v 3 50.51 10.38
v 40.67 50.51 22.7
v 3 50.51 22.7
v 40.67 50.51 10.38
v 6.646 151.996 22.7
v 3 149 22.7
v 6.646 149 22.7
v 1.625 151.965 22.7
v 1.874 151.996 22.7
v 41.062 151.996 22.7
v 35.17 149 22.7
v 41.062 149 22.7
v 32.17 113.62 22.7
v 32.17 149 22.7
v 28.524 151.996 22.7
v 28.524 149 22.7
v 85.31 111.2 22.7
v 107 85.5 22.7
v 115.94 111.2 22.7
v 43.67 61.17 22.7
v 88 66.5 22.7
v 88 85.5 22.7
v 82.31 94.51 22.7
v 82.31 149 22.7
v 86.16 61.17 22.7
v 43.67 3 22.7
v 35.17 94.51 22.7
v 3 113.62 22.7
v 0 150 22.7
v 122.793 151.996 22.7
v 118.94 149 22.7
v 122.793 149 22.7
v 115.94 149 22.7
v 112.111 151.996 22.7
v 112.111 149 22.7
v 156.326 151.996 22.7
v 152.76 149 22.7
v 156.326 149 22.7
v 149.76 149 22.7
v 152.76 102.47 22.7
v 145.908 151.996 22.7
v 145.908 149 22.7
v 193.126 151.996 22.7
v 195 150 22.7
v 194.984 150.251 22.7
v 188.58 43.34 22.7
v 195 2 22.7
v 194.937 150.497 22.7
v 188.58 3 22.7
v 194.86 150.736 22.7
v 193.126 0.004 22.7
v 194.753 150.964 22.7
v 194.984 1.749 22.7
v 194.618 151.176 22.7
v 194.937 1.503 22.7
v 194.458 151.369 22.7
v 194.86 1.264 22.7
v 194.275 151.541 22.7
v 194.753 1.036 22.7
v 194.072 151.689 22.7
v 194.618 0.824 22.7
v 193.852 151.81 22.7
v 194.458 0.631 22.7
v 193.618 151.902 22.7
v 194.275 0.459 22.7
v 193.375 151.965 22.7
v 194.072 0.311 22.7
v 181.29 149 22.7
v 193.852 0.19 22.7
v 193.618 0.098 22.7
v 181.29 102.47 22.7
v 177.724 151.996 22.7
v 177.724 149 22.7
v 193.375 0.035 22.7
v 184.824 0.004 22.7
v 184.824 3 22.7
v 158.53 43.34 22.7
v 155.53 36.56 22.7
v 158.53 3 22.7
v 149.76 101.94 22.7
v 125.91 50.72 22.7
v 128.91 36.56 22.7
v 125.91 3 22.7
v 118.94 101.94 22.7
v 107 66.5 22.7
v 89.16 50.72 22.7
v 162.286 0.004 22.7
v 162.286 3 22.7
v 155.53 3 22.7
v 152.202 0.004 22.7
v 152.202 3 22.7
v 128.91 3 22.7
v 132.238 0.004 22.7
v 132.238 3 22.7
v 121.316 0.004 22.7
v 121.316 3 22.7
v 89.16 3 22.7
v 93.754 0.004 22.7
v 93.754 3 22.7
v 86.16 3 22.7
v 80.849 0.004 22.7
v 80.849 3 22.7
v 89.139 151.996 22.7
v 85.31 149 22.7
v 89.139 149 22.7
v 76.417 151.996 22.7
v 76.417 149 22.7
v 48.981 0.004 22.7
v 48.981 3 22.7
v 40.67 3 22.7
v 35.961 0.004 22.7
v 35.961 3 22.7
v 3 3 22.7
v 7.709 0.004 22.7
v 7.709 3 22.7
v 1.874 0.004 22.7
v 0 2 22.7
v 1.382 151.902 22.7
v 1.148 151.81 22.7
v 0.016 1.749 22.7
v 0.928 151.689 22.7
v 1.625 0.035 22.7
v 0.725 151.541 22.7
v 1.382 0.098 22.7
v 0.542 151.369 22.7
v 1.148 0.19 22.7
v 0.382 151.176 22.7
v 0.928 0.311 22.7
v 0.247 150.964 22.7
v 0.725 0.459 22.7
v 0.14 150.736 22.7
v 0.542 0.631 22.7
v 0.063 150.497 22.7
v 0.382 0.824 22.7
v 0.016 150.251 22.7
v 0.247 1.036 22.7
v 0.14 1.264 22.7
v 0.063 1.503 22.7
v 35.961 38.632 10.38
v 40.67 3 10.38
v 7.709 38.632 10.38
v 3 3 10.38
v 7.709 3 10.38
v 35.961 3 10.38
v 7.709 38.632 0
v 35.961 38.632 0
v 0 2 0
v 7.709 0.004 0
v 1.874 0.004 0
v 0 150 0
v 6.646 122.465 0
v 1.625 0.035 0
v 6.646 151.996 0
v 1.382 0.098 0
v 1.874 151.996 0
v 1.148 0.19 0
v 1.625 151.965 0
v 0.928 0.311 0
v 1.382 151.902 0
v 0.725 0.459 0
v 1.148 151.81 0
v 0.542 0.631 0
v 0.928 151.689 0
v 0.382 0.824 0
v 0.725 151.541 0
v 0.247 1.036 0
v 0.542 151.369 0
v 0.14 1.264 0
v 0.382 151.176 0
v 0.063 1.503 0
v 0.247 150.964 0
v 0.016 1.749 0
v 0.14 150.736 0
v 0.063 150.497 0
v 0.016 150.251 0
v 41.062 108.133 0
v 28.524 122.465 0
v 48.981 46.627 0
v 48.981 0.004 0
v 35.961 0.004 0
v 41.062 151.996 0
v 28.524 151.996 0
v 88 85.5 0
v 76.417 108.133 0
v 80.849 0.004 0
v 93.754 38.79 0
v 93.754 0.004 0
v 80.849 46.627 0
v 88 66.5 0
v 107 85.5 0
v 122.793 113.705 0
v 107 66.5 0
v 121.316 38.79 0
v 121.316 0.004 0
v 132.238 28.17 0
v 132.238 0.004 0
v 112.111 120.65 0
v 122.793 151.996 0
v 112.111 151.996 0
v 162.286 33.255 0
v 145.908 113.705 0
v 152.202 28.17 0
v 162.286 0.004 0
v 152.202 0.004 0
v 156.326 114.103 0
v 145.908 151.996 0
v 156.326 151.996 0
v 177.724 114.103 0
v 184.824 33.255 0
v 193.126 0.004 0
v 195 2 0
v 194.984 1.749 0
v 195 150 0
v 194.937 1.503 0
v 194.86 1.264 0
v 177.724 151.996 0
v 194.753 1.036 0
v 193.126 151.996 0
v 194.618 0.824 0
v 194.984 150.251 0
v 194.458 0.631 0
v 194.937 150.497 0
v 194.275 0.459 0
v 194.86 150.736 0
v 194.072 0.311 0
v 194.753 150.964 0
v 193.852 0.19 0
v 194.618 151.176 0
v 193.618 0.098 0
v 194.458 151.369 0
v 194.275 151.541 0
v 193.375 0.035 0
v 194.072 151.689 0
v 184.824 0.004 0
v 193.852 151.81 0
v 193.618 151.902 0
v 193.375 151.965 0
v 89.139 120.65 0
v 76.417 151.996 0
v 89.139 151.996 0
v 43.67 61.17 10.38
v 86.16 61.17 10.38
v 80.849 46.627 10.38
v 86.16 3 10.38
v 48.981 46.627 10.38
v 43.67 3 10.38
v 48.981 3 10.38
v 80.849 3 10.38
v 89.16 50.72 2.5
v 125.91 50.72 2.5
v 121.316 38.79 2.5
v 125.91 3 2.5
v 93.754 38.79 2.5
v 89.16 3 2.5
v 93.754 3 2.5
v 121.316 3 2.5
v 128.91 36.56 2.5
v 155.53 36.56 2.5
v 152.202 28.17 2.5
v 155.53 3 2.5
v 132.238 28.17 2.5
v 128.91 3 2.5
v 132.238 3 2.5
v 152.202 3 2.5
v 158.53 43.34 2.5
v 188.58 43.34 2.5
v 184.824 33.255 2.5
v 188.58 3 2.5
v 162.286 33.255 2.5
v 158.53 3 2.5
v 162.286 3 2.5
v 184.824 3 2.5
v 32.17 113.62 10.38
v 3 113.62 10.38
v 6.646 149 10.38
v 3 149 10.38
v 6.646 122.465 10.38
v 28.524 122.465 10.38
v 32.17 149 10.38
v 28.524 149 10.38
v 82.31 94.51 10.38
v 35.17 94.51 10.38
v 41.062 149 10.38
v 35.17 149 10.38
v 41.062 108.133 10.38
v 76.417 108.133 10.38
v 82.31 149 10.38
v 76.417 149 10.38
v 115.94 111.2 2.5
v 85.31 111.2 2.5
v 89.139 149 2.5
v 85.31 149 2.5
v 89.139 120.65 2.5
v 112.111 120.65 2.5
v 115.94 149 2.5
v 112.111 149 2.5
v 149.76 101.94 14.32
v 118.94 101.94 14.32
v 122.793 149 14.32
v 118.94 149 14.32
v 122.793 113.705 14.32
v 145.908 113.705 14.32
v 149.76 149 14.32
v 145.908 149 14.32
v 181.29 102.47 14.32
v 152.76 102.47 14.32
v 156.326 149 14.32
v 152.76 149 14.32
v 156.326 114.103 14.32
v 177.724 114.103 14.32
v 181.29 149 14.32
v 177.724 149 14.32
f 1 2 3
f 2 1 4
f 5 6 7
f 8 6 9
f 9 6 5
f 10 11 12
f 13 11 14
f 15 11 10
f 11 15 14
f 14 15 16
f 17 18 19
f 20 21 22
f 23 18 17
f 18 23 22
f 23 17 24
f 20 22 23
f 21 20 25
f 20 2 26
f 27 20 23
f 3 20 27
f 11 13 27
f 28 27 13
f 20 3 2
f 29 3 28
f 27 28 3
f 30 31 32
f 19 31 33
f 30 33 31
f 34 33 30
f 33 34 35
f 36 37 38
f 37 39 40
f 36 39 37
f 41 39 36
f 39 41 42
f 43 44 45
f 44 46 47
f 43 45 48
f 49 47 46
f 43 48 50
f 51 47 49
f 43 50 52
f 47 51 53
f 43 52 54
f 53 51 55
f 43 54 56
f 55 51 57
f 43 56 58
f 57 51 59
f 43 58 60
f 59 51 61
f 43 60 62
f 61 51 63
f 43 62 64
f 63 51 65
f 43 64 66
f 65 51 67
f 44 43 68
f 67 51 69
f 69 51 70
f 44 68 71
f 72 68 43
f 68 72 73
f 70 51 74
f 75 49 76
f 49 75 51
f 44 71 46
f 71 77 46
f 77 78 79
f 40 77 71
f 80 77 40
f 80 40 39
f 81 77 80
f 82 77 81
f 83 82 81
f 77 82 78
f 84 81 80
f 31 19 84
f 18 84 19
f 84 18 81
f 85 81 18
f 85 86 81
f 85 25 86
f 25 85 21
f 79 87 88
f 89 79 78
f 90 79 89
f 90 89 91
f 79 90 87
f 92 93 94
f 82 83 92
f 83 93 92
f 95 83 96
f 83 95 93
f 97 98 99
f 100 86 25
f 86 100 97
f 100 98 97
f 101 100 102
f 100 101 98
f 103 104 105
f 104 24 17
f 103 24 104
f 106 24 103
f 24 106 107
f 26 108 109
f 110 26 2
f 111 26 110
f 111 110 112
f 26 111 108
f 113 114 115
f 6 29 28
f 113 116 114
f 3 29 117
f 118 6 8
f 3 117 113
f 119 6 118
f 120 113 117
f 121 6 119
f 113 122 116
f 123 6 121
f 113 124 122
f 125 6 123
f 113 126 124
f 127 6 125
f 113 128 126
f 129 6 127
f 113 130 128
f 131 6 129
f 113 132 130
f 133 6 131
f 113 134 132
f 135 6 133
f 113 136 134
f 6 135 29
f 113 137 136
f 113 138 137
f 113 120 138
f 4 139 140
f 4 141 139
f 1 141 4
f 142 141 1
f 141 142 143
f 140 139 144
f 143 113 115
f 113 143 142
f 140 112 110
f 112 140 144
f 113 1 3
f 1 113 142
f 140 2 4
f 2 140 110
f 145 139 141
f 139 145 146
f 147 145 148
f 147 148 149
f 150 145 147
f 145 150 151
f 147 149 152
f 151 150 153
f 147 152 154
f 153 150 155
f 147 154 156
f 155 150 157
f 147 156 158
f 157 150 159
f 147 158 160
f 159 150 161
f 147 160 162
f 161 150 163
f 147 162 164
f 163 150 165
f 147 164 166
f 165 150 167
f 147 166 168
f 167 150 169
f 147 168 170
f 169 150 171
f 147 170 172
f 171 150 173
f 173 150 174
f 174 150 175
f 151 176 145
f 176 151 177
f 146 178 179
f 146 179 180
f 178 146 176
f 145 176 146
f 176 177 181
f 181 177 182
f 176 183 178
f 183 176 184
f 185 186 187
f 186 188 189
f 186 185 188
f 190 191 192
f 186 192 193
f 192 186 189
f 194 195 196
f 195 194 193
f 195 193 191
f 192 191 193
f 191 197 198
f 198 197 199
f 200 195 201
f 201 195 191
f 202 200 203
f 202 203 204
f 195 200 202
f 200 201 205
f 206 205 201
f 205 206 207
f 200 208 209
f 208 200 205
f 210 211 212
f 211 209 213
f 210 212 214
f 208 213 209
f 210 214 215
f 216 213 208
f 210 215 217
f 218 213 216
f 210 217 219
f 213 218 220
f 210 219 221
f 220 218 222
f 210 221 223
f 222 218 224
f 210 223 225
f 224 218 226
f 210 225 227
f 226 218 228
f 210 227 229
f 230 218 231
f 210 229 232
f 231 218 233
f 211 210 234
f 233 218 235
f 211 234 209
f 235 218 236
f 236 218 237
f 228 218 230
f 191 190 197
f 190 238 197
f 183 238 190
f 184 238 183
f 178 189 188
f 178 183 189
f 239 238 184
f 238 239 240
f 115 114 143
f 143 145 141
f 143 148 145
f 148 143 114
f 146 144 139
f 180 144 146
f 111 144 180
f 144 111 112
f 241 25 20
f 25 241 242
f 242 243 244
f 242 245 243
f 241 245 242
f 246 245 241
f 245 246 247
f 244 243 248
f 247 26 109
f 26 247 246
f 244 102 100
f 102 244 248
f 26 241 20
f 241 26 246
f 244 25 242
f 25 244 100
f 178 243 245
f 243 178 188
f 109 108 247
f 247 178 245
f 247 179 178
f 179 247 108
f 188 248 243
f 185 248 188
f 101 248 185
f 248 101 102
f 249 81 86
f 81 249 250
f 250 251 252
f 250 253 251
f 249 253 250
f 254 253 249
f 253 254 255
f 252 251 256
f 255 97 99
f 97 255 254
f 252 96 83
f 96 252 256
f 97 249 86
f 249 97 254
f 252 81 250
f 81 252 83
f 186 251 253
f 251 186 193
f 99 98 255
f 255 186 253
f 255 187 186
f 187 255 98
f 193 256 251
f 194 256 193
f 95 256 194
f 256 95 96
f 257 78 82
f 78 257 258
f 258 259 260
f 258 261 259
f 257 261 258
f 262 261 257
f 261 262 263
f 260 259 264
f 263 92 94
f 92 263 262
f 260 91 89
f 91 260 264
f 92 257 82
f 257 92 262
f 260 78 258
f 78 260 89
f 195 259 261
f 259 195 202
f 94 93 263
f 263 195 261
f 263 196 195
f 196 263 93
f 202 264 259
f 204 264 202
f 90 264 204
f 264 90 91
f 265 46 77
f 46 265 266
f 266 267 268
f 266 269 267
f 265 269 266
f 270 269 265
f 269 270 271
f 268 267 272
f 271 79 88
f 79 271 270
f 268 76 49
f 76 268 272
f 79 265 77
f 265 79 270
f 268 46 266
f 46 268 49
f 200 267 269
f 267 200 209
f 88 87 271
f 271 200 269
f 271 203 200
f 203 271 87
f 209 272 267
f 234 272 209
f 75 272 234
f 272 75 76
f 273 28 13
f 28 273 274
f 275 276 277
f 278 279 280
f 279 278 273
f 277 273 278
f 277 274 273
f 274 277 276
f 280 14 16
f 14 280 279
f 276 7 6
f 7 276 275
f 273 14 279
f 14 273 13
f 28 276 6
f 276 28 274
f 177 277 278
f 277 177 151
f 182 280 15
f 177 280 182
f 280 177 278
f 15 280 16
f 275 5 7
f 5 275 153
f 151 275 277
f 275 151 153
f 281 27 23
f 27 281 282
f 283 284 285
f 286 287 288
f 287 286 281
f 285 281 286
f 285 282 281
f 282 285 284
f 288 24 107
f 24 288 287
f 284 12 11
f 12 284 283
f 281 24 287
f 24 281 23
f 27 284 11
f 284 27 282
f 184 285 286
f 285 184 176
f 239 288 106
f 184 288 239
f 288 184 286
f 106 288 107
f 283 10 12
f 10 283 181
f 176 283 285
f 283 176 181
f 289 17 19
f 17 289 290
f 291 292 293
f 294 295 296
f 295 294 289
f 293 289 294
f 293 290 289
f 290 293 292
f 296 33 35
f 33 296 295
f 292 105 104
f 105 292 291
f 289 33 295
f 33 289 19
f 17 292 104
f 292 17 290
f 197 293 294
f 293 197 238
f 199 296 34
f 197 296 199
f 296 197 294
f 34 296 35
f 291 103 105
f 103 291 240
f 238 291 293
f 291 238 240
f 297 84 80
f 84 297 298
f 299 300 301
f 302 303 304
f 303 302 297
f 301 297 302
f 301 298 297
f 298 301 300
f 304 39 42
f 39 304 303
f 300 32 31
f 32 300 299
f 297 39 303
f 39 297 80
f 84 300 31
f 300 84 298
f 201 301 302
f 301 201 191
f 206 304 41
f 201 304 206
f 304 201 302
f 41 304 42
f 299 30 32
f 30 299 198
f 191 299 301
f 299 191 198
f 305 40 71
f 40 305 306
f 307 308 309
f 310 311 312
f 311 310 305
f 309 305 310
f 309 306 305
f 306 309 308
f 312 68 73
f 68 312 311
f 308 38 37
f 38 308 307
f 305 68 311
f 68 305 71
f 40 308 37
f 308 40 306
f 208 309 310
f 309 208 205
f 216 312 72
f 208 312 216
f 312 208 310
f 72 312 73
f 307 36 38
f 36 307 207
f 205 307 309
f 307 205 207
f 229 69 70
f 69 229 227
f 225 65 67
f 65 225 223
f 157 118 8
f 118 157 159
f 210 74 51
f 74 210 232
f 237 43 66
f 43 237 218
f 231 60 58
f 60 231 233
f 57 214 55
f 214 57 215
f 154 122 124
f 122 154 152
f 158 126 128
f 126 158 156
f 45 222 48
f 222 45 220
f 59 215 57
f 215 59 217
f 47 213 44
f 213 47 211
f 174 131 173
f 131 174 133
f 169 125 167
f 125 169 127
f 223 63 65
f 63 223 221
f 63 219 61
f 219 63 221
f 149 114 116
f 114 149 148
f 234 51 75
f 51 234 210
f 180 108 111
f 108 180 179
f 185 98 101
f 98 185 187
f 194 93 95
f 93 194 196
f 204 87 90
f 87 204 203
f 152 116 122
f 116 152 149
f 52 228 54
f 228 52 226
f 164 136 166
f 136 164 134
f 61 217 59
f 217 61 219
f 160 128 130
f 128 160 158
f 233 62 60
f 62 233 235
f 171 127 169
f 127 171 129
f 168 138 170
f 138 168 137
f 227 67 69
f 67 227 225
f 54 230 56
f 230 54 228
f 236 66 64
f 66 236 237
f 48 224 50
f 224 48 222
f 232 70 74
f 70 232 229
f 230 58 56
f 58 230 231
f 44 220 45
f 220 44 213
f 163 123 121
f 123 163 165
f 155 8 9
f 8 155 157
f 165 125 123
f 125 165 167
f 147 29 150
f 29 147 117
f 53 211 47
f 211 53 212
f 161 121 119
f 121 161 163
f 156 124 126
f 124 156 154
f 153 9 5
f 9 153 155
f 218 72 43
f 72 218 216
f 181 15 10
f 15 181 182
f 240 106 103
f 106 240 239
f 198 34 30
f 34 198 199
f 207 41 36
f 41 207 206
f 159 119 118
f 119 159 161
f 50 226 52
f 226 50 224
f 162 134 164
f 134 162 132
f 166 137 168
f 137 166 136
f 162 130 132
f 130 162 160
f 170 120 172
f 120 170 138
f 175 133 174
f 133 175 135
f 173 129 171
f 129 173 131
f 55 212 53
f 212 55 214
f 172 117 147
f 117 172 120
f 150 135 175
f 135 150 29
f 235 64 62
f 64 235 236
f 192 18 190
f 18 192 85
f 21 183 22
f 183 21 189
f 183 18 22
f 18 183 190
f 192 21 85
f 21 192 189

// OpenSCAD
// file: SquarePileLib.scad
module LeftPile(wallThickness, totalHeight, singlePileHeight, singlePileWidth, singlePileLength, pileCount, openingSizePercent = .75){
    pileHeight = (pileCount * singlePileHeight) + .5;
    lengthOpeningSize = singlePileLength * openingSizePercent;
    widthOpeningSize = singlePileWidth * openingSizePercent;
    blockerSize = (singlePileWidth - widthOpeningSize) / 2;
    
    translate([wallThickness, wallThickness, totalHeight - pileHeight])
        cube([singlePileLength, singlePileWidth, pileHeight]);
    translate([-.00001, wallThickness + (blockerSize), 0])
        cube([wallThickness + lengthOpeningSize, widthOpeningSize, totalHeight]);
}

module RightPile(wallThickness, totalHeight, singlePileHeight, singlePileWidth, singlePileLength, pileCount, openingSizePercent = .75){
    translate([0, wallThickness + wallThickness + singlePileWidth, 0])
        rotate([0, 0, 180])
            LeftPile(wallThickness, totalHeight, singlePileHeight, singlePileWidth, singlePileLength, pileCount, openingSizePercent);
}

module BottomPile(wallThickness, totalHeight, singlePileHeight, singlePileWidth, singlePileLength, pileCount, openingSizePercent = .75){
    translate([wallThickness + wallThickness + singlePileWidth, 0, 0])
        rotate([0, 0, 90])
            LeftPile(wallThickness, totalHeight, singlePileHeight, singlePileWidth, singlePileLength, pileCount, openingSizePercent);
}

module TopPile(wallThickness, totalHeight, singlePileHeight, singlePileWidth, singlePileLength, pileCount, openingSizePercent = .75){
        rotate([0, 0, 270])
            LeftPile(wallThickness, totalHeight, singlePileHeight, singlePileWidth, singlePileLength, pileCount, openingSizePercent);
}
// main file
include<SquarePileLib.scad>

length = 195;

magnetHoleWidth = 19;
wallThickness = 3;
singlePileHeight = 1.97;
maxTokenHeight = 62;
maxTokenCount = 10;
width = wallThickness + maxTokenHeight + wallThickness + magnetHoleWidth + maxTokenHeight + wallThickness;
height = wallThickness + (maxTokenCount * singlePileHeight);

token1Width = 36.67 + 1;
token1Height = 46.51 + 1;
token1Count = 6;
token2Width = 41.49 + 1;
token2Height = 57.17 + 1;
token2Count = 6;
token3Width = 35.75 + 1;
token3Height = 46.72 + 1;
token3Count = 10;
token4Width = 25.62 + 1;
token4Height = 32.56 + 1;
token4Count = 10;
token5Width = 29.05 + 1;
token5Height = 39.34 + 1;
token5Count = 10;
token6Width = 28.17 + 1;
token6Height = 34.38 + 1;
token6Count = 6;
token7Width = 46.14 + 1;
token7Height = 53.49 + 1;
token7Count = 6;
token8Width = 29.63 + 1;
token8Height = 36.8 + 1;
token8Count = 10;
token9Width = 29.82 + 1;
token9Height = 46.06 + 1;
token9Count = 4;
token10Width = 27.53 + 1;
token10Height = 45.53 + 1;
token10Count = 4;


difference() {

    $fn=50;
    minkowski()
    {
      translate([2,2,0])
        cube([length-4, width-4, height - 1]);
      cylinder(r=2,h=1);
    }
    translate([0, 0, 0])
        BottomPile(
            wallThickness,
            height,
            singlePileHeight,
            token1Width,
            token1Height,
            token1Count
        );
    translate([token1Width + wallThickness, 0, 0])
        BottomPile(
            wallThickness,
            height,
            singlePileHeight,
            token2Width,
            token2Height,
            token2Count
        );
    translate([token1Width + token2Width + wallThickness * 2, 0, 0])
        BottomPile(
            wallThickness,
            height,
            singlePileHeight,
            token3Width,
            token3Height,
            token3Count
        );
    translate([token1Width + token2Width + token3Width + wallThickness * 3, 0, 0])
        BottomPile(
            wallThickness,
            height,
            singlePileHeight,
            token4Width,
            token4Height,
            token4Count
        );
    translate([token1Width + token2Width + token3Width + token4Width + wallThickness * 4, 0, 0])
        BottomPile(
            wallThickness,
            height,
            singlePileHeight,
            token5Width,
            token5Height,
            token5Count
        );
    
    translate([0, width, 0])
        TopPile(
            wallThickness,
            height,
            singlePileHeight,
            token6Width,
            token6Height,
            token6Count
        );
    translate([token6Width + wallThickness, width, 0])
        TopPile(
            wallThickness,
            height,
            singlePileHeight,
            token7Width,
            token7Height,
            token7Count
        );
    translate([token6Width + token7Width + wallThickness * 2, width, 0])
        TopPile(
            wallThickness,
            height,
            singlePileHeight,
            token8Width,
            token8Height,
            token8Count
        );
    translate([token6Width + token7Width + token8Width + wallThickness * 3, width, 0])
        TopPile(
            wallThickness,
            height,
            singlePileHeight,
            token9Width,
            token9Height,
            token9Count
        );
    translate([token6Width + token7Width + token8Width + token9Width + wallThickness * 4, width, 0])
        TopPile(
            wallThickness,
            height,
            singlePileHeight,
            token10Width,
            token10Height,
            token10Count
        );

    
    translate([length/2 - magnetHoleWidth/2, width/2 - magnetHoleWidth/2, 0])
        cube([magnetHoleWidth, magnetHoleWidth, height]);
}
